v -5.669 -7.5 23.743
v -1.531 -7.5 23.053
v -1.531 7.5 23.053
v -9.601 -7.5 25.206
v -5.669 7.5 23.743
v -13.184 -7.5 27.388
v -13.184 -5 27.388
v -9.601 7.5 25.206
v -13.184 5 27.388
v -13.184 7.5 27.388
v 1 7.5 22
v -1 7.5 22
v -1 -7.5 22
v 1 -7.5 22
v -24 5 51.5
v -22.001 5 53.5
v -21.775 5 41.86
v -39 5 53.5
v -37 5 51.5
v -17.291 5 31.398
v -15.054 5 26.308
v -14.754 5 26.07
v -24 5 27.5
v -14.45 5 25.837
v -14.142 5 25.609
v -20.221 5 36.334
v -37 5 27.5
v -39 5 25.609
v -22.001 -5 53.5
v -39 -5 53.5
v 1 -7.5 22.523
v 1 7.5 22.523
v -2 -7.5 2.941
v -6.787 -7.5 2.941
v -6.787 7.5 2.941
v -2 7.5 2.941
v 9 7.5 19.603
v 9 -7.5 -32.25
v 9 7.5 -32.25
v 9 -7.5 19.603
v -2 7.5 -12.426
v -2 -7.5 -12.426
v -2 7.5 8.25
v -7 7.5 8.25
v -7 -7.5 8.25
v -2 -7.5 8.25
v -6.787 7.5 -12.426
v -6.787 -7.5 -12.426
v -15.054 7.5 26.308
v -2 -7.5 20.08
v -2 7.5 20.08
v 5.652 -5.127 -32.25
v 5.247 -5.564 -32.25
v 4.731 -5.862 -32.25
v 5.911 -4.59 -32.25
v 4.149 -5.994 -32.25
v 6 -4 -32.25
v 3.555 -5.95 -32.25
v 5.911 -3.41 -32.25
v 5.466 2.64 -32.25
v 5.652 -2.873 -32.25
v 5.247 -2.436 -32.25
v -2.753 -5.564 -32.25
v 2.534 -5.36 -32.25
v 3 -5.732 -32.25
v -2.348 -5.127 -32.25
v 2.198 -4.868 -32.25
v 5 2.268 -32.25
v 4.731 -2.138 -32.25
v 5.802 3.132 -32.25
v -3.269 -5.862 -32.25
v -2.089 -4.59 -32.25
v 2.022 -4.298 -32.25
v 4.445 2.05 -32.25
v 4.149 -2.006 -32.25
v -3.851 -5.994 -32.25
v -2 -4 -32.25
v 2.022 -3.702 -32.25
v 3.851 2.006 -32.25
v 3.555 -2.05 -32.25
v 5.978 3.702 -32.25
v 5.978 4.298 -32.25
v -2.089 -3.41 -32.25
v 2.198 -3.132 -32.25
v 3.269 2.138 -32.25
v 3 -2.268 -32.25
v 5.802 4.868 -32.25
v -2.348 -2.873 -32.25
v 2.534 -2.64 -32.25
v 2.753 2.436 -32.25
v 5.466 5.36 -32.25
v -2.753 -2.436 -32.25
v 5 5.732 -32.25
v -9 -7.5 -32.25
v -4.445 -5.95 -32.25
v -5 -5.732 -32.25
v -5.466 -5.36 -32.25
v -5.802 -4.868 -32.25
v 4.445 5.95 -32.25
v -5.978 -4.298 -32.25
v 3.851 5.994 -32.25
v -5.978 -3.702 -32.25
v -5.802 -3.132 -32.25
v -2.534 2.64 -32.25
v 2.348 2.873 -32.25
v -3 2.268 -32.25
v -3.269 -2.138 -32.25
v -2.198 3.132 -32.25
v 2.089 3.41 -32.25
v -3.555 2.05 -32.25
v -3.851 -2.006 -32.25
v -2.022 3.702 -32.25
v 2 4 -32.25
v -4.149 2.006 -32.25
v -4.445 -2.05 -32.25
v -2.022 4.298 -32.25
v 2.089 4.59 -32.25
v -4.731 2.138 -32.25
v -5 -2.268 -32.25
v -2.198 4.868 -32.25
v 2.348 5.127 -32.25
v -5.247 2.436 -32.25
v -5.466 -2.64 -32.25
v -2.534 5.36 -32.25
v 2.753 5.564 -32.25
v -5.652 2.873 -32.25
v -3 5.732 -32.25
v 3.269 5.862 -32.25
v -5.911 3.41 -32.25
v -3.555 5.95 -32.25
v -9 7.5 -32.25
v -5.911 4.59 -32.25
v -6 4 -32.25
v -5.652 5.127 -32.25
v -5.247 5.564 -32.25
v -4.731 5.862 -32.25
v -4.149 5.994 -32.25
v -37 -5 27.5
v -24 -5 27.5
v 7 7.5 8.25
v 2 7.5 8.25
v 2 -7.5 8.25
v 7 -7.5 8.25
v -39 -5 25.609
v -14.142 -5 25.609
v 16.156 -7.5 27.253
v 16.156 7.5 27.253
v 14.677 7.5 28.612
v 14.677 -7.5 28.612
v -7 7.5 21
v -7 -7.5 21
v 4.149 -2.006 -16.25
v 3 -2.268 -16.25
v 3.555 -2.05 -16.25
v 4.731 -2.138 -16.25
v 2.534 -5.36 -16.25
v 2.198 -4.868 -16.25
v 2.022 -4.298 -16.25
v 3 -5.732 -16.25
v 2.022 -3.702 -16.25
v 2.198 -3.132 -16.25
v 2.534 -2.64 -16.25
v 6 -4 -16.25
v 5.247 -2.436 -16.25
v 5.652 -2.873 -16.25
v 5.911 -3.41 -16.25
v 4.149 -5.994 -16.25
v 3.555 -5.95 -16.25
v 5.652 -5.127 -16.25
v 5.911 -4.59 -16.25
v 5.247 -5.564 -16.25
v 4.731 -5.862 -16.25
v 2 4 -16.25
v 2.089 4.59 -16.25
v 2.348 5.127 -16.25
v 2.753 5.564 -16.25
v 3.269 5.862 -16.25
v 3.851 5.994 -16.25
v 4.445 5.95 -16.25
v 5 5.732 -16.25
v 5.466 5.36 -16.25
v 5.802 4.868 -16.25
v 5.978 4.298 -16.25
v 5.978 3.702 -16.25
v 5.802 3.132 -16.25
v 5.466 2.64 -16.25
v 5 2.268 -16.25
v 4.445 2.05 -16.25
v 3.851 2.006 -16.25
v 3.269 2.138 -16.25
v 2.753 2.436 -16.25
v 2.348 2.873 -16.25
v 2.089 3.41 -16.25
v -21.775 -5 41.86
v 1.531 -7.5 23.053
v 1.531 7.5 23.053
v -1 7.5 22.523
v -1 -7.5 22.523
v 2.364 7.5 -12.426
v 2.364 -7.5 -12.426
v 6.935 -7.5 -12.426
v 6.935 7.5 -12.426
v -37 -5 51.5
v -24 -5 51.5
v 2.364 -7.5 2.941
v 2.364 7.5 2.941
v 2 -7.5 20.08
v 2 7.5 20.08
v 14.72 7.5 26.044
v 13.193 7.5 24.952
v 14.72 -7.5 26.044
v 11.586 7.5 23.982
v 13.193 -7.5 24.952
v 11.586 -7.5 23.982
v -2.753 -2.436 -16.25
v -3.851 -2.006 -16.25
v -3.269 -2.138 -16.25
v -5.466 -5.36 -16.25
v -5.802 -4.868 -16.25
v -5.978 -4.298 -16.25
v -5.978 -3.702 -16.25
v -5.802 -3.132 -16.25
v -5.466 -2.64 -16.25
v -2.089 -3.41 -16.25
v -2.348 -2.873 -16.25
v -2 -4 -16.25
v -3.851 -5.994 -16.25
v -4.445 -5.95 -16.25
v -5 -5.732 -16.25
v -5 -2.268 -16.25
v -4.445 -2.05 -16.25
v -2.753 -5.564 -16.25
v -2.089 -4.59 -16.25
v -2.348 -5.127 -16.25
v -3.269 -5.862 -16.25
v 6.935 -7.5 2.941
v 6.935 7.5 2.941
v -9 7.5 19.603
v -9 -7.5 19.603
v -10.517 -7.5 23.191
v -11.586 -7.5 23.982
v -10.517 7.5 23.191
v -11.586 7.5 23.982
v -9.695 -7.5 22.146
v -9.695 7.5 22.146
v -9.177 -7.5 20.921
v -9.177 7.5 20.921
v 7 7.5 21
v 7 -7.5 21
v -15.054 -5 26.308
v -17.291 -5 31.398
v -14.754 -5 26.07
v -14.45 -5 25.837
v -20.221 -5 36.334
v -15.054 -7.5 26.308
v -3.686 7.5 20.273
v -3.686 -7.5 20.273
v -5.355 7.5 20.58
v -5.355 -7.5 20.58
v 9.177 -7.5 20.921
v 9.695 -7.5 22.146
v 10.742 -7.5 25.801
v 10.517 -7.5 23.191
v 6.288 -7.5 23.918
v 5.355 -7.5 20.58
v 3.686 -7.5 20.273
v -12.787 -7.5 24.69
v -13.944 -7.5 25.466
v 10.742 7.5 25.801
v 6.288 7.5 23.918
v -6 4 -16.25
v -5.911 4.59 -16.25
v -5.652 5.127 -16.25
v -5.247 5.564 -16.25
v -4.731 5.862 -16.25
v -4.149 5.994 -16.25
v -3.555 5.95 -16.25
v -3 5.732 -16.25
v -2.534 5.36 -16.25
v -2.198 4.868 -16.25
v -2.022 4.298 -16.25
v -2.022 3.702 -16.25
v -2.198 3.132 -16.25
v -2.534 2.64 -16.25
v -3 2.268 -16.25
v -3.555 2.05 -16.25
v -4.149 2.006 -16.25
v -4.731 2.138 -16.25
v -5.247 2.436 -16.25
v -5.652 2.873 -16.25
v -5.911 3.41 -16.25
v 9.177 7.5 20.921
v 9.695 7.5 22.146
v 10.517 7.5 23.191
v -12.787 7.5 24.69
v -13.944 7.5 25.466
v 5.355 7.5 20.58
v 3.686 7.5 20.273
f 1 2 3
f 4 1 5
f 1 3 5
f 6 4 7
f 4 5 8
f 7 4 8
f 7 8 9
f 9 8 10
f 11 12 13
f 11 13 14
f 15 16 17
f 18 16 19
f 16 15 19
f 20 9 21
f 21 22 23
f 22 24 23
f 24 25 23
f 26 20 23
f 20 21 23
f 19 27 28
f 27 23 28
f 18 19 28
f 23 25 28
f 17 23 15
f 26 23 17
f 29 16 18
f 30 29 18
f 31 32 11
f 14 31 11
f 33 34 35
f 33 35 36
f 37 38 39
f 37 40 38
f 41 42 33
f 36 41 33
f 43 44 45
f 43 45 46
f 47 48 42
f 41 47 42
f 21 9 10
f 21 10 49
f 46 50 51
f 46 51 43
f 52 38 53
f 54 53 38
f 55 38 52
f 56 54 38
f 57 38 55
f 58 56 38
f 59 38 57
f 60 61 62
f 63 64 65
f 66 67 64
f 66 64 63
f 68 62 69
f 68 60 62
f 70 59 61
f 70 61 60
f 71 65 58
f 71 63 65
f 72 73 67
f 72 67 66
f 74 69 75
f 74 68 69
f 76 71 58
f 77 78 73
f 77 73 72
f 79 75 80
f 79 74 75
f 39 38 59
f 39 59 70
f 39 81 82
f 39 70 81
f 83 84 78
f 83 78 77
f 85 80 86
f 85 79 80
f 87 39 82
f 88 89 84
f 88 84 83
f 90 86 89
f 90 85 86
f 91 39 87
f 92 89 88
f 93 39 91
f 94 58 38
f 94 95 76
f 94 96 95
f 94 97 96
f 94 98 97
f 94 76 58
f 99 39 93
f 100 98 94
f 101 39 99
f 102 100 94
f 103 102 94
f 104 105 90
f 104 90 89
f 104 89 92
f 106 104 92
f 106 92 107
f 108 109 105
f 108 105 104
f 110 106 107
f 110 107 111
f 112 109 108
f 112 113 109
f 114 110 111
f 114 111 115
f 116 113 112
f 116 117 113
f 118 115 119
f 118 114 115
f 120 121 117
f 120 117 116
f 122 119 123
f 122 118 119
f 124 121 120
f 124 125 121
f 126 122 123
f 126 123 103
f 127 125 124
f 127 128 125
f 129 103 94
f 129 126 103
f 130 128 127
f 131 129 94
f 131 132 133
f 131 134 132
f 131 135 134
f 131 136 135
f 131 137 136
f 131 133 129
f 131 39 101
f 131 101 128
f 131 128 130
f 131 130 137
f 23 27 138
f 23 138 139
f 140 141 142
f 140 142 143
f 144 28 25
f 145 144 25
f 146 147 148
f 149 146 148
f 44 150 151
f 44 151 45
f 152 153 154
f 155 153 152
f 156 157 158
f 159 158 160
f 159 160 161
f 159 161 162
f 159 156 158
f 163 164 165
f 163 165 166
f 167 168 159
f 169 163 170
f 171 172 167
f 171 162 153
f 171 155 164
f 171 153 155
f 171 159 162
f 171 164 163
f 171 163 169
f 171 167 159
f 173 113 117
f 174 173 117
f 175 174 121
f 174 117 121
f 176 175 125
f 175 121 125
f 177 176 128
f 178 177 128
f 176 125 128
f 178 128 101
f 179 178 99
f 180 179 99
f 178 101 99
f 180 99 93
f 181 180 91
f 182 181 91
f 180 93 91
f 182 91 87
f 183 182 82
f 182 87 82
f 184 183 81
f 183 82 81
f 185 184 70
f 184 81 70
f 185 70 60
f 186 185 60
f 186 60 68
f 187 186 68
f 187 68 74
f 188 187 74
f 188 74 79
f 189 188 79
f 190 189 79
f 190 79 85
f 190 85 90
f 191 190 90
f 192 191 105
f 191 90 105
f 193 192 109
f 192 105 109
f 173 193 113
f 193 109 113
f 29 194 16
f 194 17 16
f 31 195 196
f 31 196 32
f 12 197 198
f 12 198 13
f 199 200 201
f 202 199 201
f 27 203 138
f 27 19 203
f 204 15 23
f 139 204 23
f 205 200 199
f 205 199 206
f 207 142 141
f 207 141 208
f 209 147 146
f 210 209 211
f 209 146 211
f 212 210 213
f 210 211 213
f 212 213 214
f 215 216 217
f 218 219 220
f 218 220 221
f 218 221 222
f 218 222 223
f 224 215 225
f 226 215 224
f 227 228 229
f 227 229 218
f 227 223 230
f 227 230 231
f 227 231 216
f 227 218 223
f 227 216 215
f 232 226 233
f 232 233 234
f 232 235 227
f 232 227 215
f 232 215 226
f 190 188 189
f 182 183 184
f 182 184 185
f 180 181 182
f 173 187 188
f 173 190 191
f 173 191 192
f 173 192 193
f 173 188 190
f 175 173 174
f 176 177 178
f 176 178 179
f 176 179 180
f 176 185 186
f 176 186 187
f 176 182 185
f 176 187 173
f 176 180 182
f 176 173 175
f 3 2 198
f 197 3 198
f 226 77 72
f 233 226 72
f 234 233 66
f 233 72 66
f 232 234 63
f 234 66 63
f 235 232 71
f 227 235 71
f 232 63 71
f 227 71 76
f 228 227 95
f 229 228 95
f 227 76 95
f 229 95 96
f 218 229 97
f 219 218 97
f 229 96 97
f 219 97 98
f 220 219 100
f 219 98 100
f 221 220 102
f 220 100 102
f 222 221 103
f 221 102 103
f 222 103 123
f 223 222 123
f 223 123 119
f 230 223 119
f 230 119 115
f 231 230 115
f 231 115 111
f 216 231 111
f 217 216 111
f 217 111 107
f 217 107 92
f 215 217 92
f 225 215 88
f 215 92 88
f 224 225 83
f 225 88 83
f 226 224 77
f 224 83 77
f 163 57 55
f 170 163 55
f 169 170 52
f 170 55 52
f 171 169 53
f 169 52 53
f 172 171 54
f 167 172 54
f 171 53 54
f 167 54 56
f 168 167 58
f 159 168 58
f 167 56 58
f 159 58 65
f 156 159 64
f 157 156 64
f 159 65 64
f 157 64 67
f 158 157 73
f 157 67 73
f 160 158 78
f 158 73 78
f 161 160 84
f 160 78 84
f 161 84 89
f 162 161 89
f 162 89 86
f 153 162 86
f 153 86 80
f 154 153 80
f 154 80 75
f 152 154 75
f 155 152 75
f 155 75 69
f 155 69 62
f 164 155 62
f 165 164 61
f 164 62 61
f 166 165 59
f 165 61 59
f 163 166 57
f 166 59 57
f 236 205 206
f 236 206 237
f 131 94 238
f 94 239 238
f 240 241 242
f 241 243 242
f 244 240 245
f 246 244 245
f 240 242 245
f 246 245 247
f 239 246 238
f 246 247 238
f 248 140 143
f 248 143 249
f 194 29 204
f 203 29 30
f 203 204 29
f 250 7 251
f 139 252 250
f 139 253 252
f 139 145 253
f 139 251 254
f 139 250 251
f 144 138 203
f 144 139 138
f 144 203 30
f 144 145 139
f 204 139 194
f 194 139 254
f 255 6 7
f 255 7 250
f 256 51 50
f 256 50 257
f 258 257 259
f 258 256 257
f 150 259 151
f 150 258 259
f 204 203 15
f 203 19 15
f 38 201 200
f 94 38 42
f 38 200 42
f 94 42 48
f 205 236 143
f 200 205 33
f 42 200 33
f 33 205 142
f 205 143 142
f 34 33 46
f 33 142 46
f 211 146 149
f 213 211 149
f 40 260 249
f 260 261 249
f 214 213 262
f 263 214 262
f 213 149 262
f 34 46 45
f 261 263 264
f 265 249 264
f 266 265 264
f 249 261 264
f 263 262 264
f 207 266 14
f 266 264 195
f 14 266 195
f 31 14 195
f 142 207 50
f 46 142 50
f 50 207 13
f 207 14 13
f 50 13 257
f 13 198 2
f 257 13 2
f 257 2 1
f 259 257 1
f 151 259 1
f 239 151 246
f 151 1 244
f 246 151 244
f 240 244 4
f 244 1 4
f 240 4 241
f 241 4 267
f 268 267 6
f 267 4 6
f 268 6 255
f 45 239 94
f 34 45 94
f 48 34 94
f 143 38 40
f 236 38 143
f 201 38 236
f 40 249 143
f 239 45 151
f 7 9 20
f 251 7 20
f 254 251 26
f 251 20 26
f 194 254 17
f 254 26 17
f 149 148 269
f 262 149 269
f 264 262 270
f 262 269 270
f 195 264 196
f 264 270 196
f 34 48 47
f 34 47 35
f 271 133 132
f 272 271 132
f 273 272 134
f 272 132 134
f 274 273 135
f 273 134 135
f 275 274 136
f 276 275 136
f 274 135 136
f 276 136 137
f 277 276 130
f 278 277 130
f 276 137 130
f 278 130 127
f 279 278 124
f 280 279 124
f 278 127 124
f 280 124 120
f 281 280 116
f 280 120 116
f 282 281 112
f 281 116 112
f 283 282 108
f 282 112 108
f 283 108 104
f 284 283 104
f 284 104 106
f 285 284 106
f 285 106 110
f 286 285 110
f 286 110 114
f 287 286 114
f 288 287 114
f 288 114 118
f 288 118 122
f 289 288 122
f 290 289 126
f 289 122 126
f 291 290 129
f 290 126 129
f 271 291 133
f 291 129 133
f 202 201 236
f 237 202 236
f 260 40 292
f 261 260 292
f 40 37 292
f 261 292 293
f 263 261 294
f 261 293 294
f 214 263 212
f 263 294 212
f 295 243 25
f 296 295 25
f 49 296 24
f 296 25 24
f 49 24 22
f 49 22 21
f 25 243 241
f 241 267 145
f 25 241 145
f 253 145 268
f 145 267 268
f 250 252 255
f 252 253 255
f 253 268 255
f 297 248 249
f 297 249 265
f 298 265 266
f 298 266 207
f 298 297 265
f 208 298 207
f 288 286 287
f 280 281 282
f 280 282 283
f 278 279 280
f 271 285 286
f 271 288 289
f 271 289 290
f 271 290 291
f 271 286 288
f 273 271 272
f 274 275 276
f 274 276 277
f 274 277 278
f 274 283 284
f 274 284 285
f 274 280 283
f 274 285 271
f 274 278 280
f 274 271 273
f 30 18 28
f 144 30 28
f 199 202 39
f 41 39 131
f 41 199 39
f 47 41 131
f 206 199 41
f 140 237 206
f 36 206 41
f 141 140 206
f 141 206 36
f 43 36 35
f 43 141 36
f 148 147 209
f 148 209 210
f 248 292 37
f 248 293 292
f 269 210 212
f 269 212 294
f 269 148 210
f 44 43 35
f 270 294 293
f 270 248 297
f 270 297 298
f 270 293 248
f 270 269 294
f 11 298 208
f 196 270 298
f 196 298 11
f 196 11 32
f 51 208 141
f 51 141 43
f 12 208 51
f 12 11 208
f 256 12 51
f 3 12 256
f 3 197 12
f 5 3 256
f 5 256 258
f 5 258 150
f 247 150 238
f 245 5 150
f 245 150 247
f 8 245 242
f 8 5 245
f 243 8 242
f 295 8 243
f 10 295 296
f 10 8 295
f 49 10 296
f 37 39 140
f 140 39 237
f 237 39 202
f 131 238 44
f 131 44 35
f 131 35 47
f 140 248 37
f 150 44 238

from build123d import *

# Parameters (mm, degrees)
SKETCH_1_W           = 20
SKETCH_1_H           = 20
SKETCH_1_W_2         = 11.5
SKETCH_1_H_2         = 11.5
EXTRUDE_1_DEPTH      = 7.5
EXTRUDE_2_DEPTH      = 20
SKETCH_4_W           = 6
SKETCH_4_H           = 17.5
CUT_EXTRUDE_1_DEPTH  = 33.882366095
SKETCH_5_R           = 2
CUT_EXTRUDE_2_DEPTH  = 35.820970693
SKETCH_6_OUTSIDE_W   = 31.014
SKETCH_6_OUTSIDE_H   = 48.514
SKETCH_6_OUTSIDE_W_2 = 18
SKETCH_6_OUTSIDE_H_2 = 37.5
CUT_EXTRUDE_5_DEPTH  = 33.882366095
EXTRUDE_3_DEPTH      = 15
CUT_EXTRUDE_6_DEPTH  = 75.578817368
CUT_EXTRUDE_9_DEPTH  = 37.120005833
SKETCH_12_W          = 2
SKETCH_12_H          = 2
CUT_EXTRUDE_10_DEPTH = 16
EXTRUDE_START        = -15
EXTRUDE_4_DEPTH      = 15
SKETCH_14_W          = 13
SKETCH_14_H          = 24
EXTRUDE_5_DEPTH      = 5
FILLET_3_R           = 5
CHAMFER_1_SIZE       = 0.5
CUT_EXTRUDE_11_DEPTH = 64
SKETCH_16_W          = 18
SKETCH_16_H          = 15
EXTRUDE_6_DEPTH      = 3
SKETCH_17_W          = 18
SKETCH_17_H          = 15
EXTRUDE_7_DEPTH      = 35
SKETCH_18_W          = 4.570911685
SKETCH_18_H          = 15.367720323
SKETCH_18_W_2        = 4.787102878
CUT_EXTRUDE_12_DEPTH = 66
SKETCH_19_R          = 2
CUT_EXTRUDE_13_DEPTH = 16


with BuildPart() as part:
    # 草图1 → 凸台-拉伸1 (new, symmetric)
    with BuildSketch(Plane(origin=(0, 0, 0), x_dir=(1, 0, 0), z_dir=(0, 1, 0))):
        Rectangle(SKETCH_1_W, SKETCH_1_H)
        Rectangle(SKETCH_1_W_2, SKETCH_1_H_2, mode=Mode.SUBTRACT)
    extrude(amount=EXTRUDE_1_DEPTH, both=True)

    # 草图3 → 凸台-拉伸2 (add)
    with BuildSketch(Plane.ZY.offset(10)):
        with BuildLine():
            Line((-10, -5), (-14.409830056, -5))
            ThreePointArc((-14.409830056, -5), (-27.5, 0), (-14.409830056, 5))
            Line((-14.409830056, 5), (-10, 5))
            Line((-10, 5), (-10, -5))
        make_face()
    extrude(amount=-EXTRUDE_2_DEPTH)

    # 草图4 → 切除-拉伸1 (cut, through all)
    with BuildSketch(Plane(origin=(0, 7.5, 0), x_dir=(1, 0, 0), z_dir=(0, 1, 0))):
        with Locations((-0.204363536, 18.75)):
            Rectangle(SKETCH_4_W, SKETCH_4_H)
    extrude(amount=-CUT_EXTRUDE_1_DEPTH, mode=Mode.SUBTRACT)

    # 草图5 → 切除-拉伸2 (cut, through all)
    with BuildSketch(Plane.ZY.offset(10)):
        with Locations((-20, 0)):
            Circle(SKETCH_5_R)
    extrude(amount=-CUT_EXTRUDE_2_DEPTH, mode=Mode.SUBTRACT)

    # 草图6 outside → 切除-拉伸5 (cut, through all)
    with BuildSketch(Plane(origin=(0, 7.5, 0), x_dir=(1, 0, 0), z_dir=(0, 1, 0))):
        with Locations((0, 8.75)):
            Rectangle(SKETCH_6_OUTSIDE_W, SKETCH_6_OUTSIDE_H)
        with Locations((0, 8.75)):
            Rectangle(SKETCH_6_OUTSIDE_W_2, SKETCH_6_OUTSIDE_H_2, mode=Mode.SUBTRACT)
    extrude(amount=-CUT_EXTRUDE_5_DEPTH, mode=Mode.SUBTRACT)


with BuildPart() as body_2:
    # 草图7 → 凸台-拉伸3 (new body)
    with BuildSketch(Plane.XZ.offset(7.5)):
        with BuildLine():
            Line((-9, 10), (-9, 22.751404539))
            ThreePointArc((-9, 22.751404539), (0, 69), (9, 22.751404539))
            Line((9, 22.751404539), (9, 10))
            Line((9, 10), (-9, 10))
        make_face()
    extrude(amount=-EXTRUDE_3_DEPTH)

    # 草图10 → 切除-拉伸6 (cut, through all)
    with BuildSketch(Plane(origin=(0, 7.5, 0), x_dir=(1, 0, 0), z_dir=(0, 1, 0))):
        with BuildLine():
            Line((-13.184152869, -27.388125792), (-20.784609691, -23))
            ThreePointArc((-20.784609691, -23), (0, -75.265491901), (20.784609691, -23))
            Line((20.784609691, -23), (14.677253023, -28.611643044))
            ThreePointArc((14.677253023, -28.611643044), (0.965186839, -23.021182599), (-13.184152869, -27.388125792))
        make_face()
    extrude(amount=-CUT_EXTRUDE_6_DEPTH, mode=Mode.SUBTRACT)


with BuildPart() as part_1:
    add(part.part)

    # Combine 1: union body 2
    add(body_2.part)

    # 草图11 → 切除-拉伸9 (cut, through all)
    with BuildSketch(Plane(origin=(0, 7.5, 0), x_dir=(1, 0, 0), z_dir=(0, 1, 0))):
        with BuildLine():
            Line((-7, -8.25), (7, -8.25))
            Line((7, -8.25), (7, -21))
            ThreePointArc((7, -21), (0, -20), (-7, -21))
            Line((-7, -21), (-7, -8.25))
        make_face()
    extrude(amount=-CUT_EXTRUDE_9_DEPTH, mode=Mode.SUBTRACT)

    # 草图12 → 切除-拉伸10 (cut)
    with BuildSketch(Plane(origin=(0, 7.5, 0), x_dir=(1, 0, 0), z_dir=(0, 1, 0))):
        with Locations((0, -23)):
            Rectangle(SKETCH_12_W, SKETCH_12_H)
    extrude(amount=-CUT_EXTRUDE_10_DEPTH, mode=Mode.SUBTRACT)

    # 草图13 → 凸台-拉伸4 (add)
    with BuildSketch(Plane.XZ.offset(7.5).offset(EXTRUDE_START)):
        with BuildLine():
            Line((-2, 20.080128411), (-2, 8.25))
            Line((-2, 8.25), (2, 8.25))
            Line((2, 8.25), (2, 20.080128411))
            ThreePointArc((2, 20.080128411), (0, 20), (-2, 20.080128411))
        make_face()
    extrude(amount=EXTRUDE_4_DEPTH)

    # 草图14 → 凸台-拉伸5 (add, symmetric)
    with BuildSketch(Plane(origin=(0, 0, 0), x_dir=(1, 0, 0), z_dir=(0, 1, 0))):
        with BuildLine():
            Line((-39.000369788, -25.608987518), (-10.391758029, -25.608987518))
            ThreePointArc((-10.391758029, -25.608987518), (-18.019377527, -32.37850906), (-21.774804011, -41.860269078))
            Line((-21.774804011, -41.860269078), (-22.000976364, -53.5))
            Line((-22.000976364, -53.5), (-39.000369788, -53.5))
            Line((-39.000369788, -53.5), (-39.000369788, -25.608987518))
        make_face()
        with Locations((-30.500369788, -39.5)):
            Rectangle(SKETCH_14_W, SKETCH_14_H, mode=Mode.SUBTRACT)
    extrude(amount=EXTRUDE_5_DEPTH, both=True)

    # 圆角3
    fillet_3_edges = [part_1.edges().sort_by_distance(p)[0] for p in [
        (-9, 0, 22.751404539),
        (9, 0, 22.751404539),
    ]]
    fillet(fillet_3_edges, radius=FILLET_3_R)

    # 倒角1
    # the kernel refuses this chamfer: 0.524377325, 0.5 mm, written as the material it takes off along each edge
    with BuildSketch(Plane(origin=(1, -8.868212894, 23.022739024), x_dir=(0.9983445219574435, 0, 0.05751708856995105), z_dir=(0, 1, 0))) as chamfer_1_piece_1:
        with BuildLine():
            Line((0.531447088, 0), (-CHAMFER_1_SIZE * 0.05751708857, CHAMFER_1_SIZE * 0.998344521957))
            Line((-CHAMFER_1_SIZE * 0.05751708857, CHAMFER_1_SIZE * 0.998344521957), (0, 0))
            ThreePointArc((0, 0), (0.273556674, 0.001603414), (0.531447088, 0))
        make_face()
    extrude(amount=17.736425787, mode=Mode.SUBTRACT)
    with BuildSketch(Plane(origin=(-1, -8.868212894, 23.022739024), x_dir=(-0.9983445219574435, 0, 0.05751708856995064), z_dir=(0, 1, 0))) as chamfer_1_piece_2:
        with BuildLine():
            Line((0.531447088, 0), (-CHAMFER_1_SIZE * 0.05751708857, -CHAMFER_1_SIZE * 0.998344521957))
            Line((-CHAMFER_1_SIZE * 0.05751708857, -CHAMFER_1_SIZE * 0.998344521957), (0, 0))
            ThreePointArc((0, 0), (0.273556674, -0.001603414), (0.531447088, 0))
        make_face()
    extrude(amount=17.736425787, mode=Mode.SUBTRACT)

    # 草图15 → 切除-拉伸11 (cut)
    with BuildSketch(Plane(origin=(0, 7.5, 0), x_dir=(1, 0, 0), z_dir=(0, 1, 0))):
        Polygon((-5.75, -5.75), (20.030525029, -5.75), (22.202632228, 33.927378984), (-42.503618679, 32.062961585), (-42.503618679, 30.637230633), (-36.910366482, 4.316043823), (-9, -5.75), align=None)
    extrude(amount=-CUT_EXTRUDE_11_DEPTH, mode=Mode.SUBTRACT)

    # 草图16 → 凸台-拉伸6 (add)
    with BuildSketch(Plane(origin=(0, 0, 5.75), x_dir=(-1, 0, 0), z_dir=(0, 0, -1))):
        Rectangle(SKETCH_16_W, SKETCH_16_H)
    extrude(amount=EXTRUDE_6_DEPTH)

    # 草图17 → 凸台-拉伸7 (add)
    with BuildSketch(Plane(origin=(0, 0, 2.75), x_dir=(-1, 0, 0), z_dir=(0, 0, -1))):
        Rectangle(SKETCH_17_W, SKETCH_17_H)
    extrude(amount=EXTRUDE_7_DEPTH)

    # 草图18 → 切除-拉伸12 (cut)
    with BuildSketch(Plane.XZ.offset(7.5)):
        with Locations((4.649601127, -4.742503957)):
            Rectangle(SKETCH_18_W, SKETCH_18_H)
        with Locations((-4.393551439, -4.742503957)):
            Rectangle(SKETCH_18_W_2, SKETCH_18_H)
    extrude(amount=-CUT_EXTRUDE_12_DEPTH, mode=Mode.SUBTRACT)

    # 草图19 → 切除-拉伸13 (cut)
    with BuildSketch(Plane(origin=(0, 0, -32.25), x_dir=(-1, 0, 0), z_dir=(0, 0, -1))):
        with Locations((-4, 4)):
            Circle(SKETCH_19_R)
        with Locations((4, 4)):
            Circle(SKETCH_19_R)
        with Locations(Location((4, -4, 0), (0, 0, 180))):
            Circle(SKETCH_19_R)
        with Locations(Location((-4, -4, 0), (0, 0, 180))):
            Circle(SKETCH_19_R)
    extrude(amount=-CUT_EXTRUDE_13_DEPTH, mode=Mode.SUBTRACT)


solid = part_1.part
